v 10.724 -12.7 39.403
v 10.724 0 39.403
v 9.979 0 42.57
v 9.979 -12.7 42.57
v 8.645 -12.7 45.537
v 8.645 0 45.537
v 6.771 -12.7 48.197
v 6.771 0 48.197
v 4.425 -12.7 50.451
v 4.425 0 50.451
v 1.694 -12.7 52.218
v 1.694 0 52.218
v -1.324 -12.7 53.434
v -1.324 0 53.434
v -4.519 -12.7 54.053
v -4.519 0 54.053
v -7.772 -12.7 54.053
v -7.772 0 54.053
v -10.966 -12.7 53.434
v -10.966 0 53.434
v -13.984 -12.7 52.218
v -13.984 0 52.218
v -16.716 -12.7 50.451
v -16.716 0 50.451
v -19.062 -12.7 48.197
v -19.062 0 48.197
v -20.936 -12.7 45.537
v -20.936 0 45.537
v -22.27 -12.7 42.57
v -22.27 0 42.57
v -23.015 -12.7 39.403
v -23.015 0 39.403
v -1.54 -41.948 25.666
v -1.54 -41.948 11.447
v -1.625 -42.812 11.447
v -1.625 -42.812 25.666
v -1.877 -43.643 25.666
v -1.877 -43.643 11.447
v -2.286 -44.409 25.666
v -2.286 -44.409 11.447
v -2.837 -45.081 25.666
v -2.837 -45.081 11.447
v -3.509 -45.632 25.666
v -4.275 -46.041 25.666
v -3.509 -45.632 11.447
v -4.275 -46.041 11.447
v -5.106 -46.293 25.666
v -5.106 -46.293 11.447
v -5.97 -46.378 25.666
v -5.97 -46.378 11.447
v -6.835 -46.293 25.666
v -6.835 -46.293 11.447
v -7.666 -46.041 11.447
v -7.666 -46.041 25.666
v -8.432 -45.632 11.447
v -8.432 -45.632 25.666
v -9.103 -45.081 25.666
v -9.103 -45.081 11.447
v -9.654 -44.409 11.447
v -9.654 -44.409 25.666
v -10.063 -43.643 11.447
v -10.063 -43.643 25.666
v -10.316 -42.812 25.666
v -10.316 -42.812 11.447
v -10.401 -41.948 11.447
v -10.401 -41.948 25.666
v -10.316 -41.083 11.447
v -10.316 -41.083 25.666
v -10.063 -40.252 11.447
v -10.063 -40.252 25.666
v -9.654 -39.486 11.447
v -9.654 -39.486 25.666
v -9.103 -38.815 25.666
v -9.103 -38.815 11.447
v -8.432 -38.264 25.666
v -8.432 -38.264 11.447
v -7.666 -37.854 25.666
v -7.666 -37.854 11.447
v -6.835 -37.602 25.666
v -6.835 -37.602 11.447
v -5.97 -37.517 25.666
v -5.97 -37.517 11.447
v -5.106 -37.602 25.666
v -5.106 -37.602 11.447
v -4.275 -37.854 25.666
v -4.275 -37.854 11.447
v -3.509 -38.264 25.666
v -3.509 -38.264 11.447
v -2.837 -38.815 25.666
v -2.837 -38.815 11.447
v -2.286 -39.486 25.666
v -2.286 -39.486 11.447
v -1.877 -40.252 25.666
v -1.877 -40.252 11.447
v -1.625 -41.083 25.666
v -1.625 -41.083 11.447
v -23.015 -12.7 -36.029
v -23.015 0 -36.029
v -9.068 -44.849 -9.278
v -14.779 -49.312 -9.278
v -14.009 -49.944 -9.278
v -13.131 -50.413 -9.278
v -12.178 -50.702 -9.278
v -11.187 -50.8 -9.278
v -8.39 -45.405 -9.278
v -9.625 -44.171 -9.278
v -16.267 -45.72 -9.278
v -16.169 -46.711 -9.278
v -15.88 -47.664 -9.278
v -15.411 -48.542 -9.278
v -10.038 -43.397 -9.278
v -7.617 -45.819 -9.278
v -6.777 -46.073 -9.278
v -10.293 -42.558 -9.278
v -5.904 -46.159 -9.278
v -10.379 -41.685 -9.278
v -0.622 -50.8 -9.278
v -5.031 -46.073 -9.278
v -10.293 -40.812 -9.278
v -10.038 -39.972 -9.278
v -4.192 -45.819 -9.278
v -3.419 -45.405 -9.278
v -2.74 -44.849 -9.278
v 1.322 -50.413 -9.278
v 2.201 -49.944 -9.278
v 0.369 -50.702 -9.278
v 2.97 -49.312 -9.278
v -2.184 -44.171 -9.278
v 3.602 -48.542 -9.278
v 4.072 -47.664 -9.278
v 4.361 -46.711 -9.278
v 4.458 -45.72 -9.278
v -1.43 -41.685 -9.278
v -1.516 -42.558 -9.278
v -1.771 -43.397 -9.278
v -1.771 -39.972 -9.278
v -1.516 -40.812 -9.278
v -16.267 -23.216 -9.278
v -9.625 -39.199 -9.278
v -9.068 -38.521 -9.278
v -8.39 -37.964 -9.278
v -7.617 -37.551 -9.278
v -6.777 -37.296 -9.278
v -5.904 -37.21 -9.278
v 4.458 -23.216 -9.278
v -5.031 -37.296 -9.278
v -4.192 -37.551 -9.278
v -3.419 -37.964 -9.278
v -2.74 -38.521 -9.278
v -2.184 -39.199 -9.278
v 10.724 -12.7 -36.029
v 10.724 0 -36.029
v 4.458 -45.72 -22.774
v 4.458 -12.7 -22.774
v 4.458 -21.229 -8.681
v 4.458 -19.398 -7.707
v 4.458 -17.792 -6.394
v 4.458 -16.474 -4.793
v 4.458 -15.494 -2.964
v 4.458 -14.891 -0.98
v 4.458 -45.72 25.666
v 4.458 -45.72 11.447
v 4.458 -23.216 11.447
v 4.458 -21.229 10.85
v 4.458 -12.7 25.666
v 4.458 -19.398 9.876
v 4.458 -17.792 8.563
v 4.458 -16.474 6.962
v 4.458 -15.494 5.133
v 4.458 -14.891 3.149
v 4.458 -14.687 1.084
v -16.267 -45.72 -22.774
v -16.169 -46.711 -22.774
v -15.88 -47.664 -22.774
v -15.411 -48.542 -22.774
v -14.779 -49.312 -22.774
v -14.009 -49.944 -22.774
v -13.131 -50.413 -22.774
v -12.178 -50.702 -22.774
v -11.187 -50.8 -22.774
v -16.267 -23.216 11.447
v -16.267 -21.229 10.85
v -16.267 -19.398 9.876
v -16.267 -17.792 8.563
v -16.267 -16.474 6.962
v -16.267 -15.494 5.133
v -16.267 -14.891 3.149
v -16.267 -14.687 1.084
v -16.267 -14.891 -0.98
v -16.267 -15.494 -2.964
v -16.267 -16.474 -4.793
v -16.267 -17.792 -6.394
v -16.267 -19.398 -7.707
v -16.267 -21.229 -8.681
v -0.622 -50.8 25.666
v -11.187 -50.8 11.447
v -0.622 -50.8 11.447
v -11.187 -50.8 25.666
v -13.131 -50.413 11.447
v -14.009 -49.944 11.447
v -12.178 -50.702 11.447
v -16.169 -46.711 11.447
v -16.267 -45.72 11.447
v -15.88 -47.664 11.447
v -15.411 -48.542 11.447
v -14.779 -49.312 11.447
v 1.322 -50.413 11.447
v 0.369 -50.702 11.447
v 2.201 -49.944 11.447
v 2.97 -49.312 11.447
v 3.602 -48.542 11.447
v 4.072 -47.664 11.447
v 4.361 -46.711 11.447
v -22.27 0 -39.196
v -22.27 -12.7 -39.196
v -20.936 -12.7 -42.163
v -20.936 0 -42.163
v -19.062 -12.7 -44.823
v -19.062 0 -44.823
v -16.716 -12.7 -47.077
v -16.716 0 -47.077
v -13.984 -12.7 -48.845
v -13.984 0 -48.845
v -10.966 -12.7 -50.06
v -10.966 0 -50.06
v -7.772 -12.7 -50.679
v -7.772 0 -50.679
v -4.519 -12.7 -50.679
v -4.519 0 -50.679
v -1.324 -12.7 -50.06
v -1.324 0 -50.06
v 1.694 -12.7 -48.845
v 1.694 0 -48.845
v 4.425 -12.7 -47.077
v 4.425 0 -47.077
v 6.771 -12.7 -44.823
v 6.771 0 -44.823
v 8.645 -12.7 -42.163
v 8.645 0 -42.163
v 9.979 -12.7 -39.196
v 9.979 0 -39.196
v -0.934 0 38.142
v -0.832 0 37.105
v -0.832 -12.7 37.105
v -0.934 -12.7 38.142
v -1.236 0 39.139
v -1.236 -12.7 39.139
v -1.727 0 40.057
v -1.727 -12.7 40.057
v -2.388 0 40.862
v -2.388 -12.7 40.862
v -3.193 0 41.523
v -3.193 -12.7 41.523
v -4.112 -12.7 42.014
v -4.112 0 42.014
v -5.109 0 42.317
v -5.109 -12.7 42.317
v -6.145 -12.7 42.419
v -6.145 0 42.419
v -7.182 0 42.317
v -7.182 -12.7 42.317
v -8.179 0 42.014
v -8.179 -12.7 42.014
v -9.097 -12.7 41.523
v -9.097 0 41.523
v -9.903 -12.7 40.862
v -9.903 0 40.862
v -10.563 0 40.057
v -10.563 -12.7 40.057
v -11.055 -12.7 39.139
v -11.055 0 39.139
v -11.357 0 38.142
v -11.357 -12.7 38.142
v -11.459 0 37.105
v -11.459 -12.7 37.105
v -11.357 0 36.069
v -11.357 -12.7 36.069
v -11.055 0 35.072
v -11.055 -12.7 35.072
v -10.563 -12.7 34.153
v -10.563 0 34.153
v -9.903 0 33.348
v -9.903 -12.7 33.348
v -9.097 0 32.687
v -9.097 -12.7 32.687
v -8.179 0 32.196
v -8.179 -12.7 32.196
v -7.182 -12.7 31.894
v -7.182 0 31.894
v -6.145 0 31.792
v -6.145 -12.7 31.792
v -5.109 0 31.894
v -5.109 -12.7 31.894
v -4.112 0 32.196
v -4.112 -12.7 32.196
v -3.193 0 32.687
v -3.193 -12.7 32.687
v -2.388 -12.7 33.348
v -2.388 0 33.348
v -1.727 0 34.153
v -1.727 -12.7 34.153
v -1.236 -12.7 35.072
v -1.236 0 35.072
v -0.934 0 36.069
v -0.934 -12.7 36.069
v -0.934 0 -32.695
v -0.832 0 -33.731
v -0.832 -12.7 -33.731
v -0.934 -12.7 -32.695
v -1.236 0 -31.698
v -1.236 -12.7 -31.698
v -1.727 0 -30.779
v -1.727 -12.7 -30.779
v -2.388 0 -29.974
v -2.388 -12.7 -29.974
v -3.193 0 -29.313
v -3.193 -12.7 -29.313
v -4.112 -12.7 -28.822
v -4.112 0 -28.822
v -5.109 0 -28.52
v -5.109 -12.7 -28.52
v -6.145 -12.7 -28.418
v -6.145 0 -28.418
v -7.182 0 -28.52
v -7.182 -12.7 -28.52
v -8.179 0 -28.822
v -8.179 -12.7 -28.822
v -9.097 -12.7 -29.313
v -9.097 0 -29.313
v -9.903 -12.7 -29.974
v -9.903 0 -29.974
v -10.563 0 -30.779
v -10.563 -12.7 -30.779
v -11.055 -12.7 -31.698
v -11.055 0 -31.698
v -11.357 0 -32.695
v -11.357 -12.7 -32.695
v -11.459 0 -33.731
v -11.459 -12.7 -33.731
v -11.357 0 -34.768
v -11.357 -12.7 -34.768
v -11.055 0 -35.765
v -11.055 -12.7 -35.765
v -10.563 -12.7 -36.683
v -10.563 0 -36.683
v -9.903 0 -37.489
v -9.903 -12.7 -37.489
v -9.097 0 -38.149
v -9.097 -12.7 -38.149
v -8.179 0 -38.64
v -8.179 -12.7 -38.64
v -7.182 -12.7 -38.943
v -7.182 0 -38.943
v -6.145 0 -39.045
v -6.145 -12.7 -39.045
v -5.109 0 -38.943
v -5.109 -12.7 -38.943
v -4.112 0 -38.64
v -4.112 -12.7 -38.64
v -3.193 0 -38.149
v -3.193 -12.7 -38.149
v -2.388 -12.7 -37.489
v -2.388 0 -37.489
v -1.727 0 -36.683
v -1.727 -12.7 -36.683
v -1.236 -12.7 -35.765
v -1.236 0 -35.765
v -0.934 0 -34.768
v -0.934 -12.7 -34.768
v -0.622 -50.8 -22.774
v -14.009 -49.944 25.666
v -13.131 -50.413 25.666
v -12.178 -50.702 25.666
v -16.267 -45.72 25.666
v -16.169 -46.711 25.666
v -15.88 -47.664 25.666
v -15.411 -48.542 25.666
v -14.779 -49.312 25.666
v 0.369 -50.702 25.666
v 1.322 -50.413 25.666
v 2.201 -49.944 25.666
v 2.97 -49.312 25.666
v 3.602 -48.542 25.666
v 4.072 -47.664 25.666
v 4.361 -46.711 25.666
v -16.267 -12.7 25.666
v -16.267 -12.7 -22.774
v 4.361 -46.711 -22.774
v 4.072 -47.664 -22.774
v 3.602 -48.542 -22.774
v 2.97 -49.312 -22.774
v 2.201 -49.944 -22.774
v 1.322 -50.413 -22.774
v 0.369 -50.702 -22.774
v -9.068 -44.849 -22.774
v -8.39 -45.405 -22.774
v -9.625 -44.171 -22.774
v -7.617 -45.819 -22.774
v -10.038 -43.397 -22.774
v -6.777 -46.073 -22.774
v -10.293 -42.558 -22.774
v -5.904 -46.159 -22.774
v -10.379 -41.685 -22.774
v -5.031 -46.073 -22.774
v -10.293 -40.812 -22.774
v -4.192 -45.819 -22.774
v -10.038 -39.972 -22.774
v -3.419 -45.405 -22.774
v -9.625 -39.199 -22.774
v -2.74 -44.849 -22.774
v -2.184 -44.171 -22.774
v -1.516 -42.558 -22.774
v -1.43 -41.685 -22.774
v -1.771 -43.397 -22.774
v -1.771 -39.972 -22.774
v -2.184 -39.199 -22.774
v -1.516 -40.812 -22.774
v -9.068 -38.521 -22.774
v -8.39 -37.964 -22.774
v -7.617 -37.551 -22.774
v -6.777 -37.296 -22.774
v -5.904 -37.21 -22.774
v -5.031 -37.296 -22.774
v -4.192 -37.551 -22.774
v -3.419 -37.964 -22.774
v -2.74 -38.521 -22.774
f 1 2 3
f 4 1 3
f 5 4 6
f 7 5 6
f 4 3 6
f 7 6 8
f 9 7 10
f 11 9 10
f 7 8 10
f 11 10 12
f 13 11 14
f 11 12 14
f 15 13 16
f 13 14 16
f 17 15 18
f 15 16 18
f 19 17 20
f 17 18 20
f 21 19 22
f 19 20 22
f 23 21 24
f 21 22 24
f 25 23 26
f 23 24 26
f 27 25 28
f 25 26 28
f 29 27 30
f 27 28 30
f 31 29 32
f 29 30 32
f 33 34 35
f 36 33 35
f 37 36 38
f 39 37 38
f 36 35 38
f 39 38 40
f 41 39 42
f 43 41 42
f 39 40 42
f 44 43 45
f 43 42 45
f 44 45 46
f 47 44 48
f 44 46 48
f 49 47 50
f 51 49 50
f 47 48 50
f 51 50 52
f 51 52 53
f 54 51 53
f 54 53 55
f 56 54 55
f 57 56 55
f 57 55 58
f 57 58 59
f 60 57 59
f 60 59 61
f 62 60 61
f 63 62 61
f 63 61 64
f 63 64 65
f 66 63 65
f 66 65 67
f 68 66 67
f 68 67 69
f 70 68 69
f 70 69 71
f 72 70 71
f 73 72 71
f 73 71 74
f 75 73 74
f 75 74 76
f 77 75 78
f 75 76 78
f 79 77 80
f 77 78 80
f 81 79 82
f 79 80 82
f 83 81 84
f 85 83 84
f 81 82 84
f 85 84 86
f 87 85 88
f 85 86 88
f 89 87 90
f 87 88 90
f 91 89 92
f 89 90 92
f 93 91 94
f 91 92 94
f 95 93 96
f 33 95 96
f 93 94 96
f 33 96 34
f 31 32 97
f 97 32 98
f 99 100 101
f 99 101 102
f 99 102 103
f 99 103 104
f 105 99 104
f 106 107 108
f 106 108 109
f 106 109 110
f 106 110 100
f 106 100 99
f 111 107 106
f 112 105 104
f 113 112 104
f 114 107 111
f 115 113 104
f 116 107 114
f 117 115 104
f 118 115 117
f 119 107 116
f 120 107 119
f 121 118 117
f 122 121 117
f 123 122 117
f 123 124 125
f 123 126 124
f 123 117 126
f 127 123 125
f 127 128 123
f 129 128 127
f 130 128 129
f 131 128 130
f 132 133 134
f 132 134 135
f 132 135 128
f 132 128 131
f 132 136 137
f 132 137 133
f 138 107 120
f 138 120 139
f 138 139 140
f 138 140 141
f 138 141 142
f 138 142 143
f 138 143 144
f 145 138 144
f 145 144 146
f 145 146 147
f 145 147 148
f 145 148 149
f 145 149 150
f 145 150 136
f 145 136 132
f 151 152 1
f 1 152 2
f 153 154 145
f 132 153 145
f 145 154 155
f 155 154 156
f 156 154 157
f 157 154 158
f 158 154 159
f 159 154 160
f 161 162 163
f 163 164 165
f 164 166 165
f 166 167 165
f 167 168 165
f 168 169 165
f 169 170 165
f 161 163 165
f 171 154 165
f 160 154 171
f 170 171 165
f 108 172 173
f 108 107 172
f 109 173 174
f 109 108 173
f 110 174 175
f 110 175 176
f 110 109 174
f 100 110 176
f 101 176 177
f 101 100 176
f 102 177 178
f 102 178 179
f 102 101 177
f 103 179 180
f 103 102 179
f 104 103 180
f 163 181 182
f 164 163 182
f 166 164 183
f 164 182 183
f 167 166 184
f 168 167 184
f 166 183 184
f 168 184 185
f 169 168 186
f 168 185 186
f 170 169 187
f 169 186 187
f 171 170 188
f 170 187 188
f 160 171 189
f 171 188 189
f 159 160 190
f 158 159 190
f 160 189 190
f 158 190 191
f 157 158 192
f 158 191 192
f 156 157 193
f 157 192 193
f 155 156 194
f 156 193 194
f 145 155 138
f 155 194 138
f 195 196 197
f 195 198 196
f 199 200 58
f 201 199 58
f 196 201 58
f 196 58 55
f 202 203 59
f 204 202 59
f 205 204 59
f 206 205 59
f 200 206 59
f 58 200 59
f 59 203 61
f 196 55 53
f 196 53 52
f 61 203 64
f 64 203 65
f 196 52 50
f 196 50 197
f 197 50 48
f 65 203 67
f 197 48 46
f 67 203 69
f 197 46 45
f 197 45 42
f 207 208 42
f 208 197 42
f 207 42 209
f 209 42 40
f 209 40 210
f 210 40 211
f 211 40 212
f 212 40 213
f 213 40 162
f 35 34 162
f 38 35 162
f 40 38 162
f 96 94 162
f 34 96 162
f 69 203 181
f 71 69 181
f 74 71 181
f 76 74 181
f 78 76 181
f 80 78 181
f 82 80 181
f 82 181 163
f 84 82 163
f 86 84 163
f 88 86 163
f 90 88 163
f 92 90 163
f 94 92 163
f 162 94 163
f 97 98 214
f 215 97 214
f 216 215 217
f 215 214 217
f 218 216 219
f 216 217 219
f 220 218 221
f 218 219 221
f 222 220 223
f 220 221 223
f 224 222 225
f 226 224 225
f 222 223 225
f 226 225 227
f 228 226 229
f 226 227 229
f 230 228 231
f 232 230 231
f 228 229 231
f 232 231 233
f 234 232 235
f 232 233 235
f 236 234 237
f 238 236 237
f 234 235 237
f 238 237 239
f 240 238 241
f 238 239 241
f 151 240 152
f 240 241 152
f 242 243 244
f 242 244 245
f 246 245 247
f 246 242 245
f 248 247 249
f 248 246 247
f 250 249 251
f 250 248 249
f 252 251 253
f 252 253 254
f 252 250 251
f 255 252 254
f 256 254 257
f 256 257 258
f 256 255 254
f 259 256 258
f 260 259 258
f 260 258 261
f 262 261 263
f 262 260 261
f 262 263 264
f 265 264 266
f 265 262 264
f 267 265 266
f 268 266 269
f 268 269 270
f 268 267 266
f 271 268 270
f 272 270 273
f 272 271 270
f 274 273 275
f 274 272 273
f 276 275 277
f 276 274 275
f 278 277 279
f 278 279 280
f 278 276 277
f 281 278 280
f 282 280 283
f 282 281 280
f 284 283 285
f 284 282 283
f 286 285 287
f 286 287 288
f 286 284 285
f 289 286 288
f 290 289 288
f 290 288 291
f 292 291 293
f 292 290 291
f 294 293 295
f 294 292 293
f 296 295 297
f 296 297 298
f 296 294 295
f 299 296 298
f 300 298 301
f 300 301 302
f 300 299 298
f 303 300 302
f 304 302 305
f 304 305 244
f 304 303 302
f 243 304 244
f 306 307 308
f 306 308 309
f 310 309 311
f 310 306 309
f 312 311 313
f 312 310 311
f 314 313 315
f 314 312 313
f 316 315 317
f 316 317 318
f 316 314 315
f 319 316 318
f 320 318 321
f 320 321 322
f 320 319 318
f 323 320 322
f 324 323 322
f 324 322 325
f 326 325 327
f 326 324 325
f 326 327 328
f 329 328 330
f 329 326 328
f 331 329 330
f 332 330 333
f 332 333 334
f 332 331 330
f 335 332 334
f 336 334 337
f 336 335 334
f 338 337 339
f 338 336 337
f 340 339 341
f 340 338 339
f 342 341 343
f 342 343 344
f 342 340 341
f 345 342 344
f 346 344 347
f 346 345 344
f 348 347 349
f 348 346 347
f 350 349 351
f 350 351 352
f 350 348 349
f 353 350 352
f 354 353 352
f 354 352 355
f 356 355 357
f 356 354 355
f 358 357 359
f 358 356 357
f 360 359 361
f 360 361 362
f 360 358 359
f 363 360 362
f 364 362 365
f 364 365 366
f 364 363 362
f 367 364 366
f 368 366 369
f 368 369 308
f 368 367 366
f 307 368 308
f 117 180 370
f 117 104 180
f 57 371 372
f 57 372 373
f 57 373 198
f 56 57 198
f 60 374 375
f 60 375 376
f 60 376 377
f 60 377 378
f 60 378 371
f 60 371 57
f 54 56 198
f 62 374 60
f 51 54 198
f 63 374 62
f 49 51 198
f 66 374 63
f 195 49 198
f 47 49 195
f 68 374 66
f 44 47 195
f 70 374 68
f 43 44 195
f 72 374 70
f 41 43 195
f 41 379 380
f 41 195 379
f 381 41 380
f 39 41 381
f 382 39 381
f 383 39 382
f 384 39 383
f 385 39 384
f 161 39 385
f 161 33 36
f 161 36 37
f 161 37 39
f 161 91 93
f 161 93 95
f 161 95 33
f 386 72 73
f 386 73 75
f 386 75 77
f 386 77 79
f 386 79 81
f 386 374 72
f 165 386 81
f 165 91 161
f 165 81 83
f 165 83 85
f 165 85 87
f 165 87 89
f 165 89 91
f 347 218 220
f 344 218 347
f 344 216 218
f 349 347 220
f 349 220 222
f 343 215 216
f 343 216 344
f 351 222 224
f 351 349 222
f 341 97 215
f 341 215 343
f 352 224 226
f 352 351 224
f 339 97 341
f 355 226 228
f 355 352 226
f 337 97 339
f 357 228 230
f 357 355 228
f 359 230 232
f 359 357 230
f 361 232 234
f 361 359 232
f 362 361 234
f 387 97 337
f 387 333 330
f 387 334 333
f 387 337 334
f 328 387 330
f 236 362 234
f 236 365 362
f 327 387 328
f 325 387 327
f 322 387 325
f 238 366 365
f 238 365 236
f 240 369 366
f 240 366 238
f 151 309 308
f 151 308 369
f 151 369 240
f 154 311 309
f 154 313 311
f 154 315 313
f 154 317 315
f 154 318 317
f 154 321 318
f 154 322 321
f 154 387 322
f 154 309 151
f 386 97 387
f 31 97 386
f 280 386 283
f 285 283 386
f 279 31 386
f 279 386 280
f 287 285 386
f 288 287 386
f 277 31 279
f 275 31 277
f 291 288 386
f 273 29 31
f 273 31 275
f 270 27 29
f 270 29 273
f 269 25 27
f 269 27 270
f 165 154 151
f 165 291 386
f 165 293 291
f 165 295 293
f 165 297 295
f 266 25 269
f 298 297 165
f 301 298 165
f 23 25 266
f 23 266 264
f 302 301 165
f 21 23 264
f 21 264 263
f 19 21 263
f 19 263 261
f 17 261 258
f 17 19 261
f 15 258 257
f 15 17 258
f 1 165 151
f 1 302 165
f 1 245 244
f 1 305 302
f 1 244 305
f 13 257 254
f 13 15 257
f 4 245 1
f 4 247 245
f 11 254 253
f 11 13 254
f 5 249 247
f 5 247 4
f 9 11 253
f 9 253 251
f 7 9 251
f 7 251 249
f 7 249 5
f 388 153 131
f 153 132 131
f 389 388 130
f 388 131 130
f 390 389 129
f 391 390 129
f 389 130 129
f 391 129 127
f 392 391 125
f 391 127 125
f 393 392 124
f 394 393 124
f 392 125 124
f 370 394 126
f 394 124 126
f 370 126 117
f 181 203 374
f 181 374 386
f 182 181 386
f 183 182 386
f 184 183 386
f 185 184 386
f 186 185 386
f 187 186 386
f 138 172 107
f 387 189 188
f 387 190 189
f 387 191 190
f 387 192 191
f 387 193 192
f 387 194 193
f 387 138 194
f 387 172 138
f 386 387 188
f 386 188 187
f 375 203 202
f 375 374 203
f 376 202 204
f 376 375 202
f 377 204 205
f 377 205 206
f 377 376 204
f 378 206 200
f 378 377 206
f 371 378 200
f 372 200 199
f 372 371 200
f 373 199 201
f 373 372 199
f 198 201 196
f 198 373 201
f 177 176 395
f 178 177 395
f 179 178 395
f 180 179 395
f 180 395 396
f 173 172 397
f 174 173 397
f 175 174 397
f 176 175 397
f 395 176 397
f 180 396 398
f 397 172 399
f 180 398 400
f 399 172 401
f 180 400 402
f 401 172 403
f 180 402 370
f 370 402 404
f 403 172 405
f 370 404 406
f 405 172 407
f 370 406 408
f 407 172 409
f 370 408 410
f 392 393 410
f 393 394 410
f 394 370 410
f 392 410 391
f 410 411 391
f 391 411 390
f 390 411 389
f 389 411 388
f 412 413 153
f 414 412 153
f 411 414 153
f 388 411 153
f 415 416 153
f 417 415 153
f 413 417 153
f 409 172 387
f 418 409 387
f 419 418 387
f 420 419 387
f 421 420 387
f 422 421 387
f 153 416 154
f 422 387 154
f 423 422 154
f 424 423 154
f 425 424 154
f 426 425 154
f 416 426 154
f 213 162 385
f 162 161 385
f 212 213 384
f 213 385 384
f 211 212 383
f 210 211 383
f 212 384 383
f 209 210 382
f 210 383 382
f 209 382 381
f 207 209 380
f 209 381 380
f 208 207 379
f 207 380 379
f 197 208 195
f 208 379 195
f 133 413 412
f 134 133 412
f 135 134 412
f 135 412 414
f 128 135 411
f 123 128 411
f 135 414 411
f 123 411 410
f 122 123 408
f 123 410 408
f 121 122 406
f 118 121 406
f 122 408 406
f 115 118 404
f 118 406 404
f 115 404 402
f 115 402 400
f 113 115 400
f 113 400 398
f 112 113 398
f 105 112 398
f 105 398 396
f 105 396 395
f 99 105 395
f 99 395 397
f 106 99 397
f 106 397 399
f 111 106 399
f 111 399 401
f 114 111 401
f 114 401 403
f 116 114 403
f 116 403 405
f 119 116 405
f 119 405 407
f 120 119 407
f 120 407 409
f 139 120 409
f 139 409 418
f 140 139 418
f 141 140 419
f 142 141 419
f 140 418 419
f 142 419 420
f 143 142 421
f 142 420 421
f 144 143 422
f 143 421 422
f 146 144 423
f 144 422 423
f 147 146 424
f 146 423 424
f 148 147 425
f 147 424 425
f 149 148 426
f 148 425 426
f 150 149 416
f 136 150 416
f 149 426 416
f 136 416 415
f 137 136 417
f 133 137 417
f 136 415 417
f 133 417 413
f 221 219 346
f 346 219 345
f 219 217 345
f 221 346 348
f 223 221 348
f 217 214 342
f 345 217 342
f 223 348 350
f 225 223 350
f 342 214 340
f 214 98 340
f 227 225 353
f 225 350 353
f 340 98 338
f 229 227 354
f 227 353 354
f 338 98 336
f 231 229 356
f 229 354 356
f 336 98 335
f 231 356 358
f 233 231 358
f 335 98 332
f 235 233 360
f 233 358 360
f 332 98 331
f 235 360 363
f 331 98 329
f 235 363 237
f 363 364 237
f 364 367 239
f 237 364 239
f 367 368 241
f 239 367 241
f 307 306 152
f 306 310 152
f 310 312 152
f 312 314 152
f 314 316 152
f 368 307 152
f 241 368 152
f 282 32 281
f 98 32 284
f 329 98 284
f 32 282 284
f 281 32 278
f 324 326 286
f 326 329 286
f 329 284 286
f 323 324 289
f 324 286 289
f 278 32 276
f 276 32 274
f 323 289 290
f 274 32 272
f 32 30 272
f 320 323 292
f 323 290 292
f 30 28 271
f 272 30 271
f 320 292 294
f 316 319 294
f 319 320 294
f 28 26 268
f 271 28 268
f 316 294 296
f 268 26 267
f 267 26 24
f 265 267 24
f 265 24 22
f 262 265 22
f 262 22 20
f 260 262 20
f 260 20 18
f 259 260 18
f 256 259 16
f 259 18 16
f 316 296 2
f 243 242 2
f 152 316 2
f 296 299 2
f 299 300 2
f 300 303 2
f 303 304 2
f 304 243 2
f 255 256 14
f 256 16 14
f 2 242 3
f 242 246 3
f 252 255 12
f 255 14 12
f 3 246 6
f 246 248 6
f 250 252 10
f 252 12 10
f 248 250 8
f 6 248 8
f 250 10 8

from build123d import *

# Parameters (mm, degrees)
F0_R      = 5.3136453871
F1_DEPTH  = 12.7
F2_W      = 20.7254816778
F2_H      = 14.2186461017
F2_H_2    = 13.4956622496
F3_DEPTH  = 50.8
F4_R      = 5.08
F5_R      = 4.4744147094
F6_DEPTH  = 25.4
F7_R      = 4.4306212016
F8_DEPTH  = 25.4
F9_W      = 20.7254816778
F9_H      = 10.515610534
F10_DEPTH = 25.4
F12_DEPTH = 25.4


with BuildPart() as f1:
    # F0 (on Front) → F1 (new body)
    with BuildSketch(Plane.XZ):
        with BuildLine():
            ThreePointArc((10.7242334634, 39.4025146961), (-6.1453450471, 54.1304557314), (-23.0149235576, 39.4025146961))
            Line((-23.0149235576, 39.4025146961), (-23.0149235576, -36.0286012292))
            ThreePointArc((-23.0149235576, -36.0286012292), (-6.1453450471, -50.7565422645), (10.7242334634, -36.0286012292))
            Line((10.7242334634, -36.0286012292), (10.7242334634, 39.4025146961))
        make_face()
        with Locations((-6.1453450471, -33.7312525427)):
            Circle(F0_R, mode=Mode.SUBTRACT)
        with Locations((-6.1453450471, 37.1051660096)):
            Circle(F0_R, mode=Mode.SUBTRACT)
    extrude(amount=F1_DEPTH)

    # F2 (on Front) → F3 (join)
    with BuildSketch(Plane.XZ):
        with Locations((-5.9043520596, 18.5565375723)):
            Rectangle(F2_W, F2_H)
        with Locations((-5.9043520596, -16.0261015408)):
            Rectangle(F2_W, F2_H_2)
    extrude(amount=F3_DEPTH)

    # F4
    f4_edges = [f1.edges().sort_by_distance(p)[0] for p in [
        (4.458389, -50.8, 18.556538),
        (-16.267093, -50.8, 18.556538),
        (4.458389, -50.8, -16.026102),
        (-16.267093, -50.8, -16.026102),
    ]]
    fillet(f4_edges, radius=F4_R)

    # F5 (on face) → F6 (cut)
    with BuildSketch(Plane(origin=(0, 0, -22.7739326656), x_dir=(1, 0, 0), z_dir=(0, 0, -1))):
        with Locations((-5.9043520596, 41.6847616434)):
            Circle(F5_R)
    extrude(amount=-F6_DEPTH, mode=Mode.SUBTRACT)

    # F7 (on face) → F8 (cut)
    with BuildSketch(Plane(origin=(0, 0, 11.4472145215), x_dir=(1, 0, 0), z_dir=(0, 0, -1))):
        with Locations((-5.9701367281, 41.9478155673)):
            Circle(F7_R)
    extrude(amount=-F8_DEPTH, mode=Mode.SUBTRACT)

    # F9 (on face) → F10 (join)
    with BuildSketch(Plane.XY.offset(-9.278270416)):
        with Locations((-5.9043520596, -17.957805267)):
            Rectangle(F9_W, F9_H)
    extrude(amount=F10_DEPTH)

    # F11 (on face) → F12 (cut)
    with BuildSketch(Plane(origin=(-16.2670928985, 0, 0), x_dir=(0, -1, 0), z_dir=(-1, 0, 0))):
        with BuildLine():
            Line((23.215610534, -9.278270416), (23.215610534, 11.4472145215))
            ThreePointArc((23.215610534, 11.4472145215), (14.6873741611, 1.0844720528), (23.215610534, -9.278270416))
        make_face()
    extrude(amount=-F12_DEPTH, mode=Mode.SUBTRACT)


solid = f1.part
